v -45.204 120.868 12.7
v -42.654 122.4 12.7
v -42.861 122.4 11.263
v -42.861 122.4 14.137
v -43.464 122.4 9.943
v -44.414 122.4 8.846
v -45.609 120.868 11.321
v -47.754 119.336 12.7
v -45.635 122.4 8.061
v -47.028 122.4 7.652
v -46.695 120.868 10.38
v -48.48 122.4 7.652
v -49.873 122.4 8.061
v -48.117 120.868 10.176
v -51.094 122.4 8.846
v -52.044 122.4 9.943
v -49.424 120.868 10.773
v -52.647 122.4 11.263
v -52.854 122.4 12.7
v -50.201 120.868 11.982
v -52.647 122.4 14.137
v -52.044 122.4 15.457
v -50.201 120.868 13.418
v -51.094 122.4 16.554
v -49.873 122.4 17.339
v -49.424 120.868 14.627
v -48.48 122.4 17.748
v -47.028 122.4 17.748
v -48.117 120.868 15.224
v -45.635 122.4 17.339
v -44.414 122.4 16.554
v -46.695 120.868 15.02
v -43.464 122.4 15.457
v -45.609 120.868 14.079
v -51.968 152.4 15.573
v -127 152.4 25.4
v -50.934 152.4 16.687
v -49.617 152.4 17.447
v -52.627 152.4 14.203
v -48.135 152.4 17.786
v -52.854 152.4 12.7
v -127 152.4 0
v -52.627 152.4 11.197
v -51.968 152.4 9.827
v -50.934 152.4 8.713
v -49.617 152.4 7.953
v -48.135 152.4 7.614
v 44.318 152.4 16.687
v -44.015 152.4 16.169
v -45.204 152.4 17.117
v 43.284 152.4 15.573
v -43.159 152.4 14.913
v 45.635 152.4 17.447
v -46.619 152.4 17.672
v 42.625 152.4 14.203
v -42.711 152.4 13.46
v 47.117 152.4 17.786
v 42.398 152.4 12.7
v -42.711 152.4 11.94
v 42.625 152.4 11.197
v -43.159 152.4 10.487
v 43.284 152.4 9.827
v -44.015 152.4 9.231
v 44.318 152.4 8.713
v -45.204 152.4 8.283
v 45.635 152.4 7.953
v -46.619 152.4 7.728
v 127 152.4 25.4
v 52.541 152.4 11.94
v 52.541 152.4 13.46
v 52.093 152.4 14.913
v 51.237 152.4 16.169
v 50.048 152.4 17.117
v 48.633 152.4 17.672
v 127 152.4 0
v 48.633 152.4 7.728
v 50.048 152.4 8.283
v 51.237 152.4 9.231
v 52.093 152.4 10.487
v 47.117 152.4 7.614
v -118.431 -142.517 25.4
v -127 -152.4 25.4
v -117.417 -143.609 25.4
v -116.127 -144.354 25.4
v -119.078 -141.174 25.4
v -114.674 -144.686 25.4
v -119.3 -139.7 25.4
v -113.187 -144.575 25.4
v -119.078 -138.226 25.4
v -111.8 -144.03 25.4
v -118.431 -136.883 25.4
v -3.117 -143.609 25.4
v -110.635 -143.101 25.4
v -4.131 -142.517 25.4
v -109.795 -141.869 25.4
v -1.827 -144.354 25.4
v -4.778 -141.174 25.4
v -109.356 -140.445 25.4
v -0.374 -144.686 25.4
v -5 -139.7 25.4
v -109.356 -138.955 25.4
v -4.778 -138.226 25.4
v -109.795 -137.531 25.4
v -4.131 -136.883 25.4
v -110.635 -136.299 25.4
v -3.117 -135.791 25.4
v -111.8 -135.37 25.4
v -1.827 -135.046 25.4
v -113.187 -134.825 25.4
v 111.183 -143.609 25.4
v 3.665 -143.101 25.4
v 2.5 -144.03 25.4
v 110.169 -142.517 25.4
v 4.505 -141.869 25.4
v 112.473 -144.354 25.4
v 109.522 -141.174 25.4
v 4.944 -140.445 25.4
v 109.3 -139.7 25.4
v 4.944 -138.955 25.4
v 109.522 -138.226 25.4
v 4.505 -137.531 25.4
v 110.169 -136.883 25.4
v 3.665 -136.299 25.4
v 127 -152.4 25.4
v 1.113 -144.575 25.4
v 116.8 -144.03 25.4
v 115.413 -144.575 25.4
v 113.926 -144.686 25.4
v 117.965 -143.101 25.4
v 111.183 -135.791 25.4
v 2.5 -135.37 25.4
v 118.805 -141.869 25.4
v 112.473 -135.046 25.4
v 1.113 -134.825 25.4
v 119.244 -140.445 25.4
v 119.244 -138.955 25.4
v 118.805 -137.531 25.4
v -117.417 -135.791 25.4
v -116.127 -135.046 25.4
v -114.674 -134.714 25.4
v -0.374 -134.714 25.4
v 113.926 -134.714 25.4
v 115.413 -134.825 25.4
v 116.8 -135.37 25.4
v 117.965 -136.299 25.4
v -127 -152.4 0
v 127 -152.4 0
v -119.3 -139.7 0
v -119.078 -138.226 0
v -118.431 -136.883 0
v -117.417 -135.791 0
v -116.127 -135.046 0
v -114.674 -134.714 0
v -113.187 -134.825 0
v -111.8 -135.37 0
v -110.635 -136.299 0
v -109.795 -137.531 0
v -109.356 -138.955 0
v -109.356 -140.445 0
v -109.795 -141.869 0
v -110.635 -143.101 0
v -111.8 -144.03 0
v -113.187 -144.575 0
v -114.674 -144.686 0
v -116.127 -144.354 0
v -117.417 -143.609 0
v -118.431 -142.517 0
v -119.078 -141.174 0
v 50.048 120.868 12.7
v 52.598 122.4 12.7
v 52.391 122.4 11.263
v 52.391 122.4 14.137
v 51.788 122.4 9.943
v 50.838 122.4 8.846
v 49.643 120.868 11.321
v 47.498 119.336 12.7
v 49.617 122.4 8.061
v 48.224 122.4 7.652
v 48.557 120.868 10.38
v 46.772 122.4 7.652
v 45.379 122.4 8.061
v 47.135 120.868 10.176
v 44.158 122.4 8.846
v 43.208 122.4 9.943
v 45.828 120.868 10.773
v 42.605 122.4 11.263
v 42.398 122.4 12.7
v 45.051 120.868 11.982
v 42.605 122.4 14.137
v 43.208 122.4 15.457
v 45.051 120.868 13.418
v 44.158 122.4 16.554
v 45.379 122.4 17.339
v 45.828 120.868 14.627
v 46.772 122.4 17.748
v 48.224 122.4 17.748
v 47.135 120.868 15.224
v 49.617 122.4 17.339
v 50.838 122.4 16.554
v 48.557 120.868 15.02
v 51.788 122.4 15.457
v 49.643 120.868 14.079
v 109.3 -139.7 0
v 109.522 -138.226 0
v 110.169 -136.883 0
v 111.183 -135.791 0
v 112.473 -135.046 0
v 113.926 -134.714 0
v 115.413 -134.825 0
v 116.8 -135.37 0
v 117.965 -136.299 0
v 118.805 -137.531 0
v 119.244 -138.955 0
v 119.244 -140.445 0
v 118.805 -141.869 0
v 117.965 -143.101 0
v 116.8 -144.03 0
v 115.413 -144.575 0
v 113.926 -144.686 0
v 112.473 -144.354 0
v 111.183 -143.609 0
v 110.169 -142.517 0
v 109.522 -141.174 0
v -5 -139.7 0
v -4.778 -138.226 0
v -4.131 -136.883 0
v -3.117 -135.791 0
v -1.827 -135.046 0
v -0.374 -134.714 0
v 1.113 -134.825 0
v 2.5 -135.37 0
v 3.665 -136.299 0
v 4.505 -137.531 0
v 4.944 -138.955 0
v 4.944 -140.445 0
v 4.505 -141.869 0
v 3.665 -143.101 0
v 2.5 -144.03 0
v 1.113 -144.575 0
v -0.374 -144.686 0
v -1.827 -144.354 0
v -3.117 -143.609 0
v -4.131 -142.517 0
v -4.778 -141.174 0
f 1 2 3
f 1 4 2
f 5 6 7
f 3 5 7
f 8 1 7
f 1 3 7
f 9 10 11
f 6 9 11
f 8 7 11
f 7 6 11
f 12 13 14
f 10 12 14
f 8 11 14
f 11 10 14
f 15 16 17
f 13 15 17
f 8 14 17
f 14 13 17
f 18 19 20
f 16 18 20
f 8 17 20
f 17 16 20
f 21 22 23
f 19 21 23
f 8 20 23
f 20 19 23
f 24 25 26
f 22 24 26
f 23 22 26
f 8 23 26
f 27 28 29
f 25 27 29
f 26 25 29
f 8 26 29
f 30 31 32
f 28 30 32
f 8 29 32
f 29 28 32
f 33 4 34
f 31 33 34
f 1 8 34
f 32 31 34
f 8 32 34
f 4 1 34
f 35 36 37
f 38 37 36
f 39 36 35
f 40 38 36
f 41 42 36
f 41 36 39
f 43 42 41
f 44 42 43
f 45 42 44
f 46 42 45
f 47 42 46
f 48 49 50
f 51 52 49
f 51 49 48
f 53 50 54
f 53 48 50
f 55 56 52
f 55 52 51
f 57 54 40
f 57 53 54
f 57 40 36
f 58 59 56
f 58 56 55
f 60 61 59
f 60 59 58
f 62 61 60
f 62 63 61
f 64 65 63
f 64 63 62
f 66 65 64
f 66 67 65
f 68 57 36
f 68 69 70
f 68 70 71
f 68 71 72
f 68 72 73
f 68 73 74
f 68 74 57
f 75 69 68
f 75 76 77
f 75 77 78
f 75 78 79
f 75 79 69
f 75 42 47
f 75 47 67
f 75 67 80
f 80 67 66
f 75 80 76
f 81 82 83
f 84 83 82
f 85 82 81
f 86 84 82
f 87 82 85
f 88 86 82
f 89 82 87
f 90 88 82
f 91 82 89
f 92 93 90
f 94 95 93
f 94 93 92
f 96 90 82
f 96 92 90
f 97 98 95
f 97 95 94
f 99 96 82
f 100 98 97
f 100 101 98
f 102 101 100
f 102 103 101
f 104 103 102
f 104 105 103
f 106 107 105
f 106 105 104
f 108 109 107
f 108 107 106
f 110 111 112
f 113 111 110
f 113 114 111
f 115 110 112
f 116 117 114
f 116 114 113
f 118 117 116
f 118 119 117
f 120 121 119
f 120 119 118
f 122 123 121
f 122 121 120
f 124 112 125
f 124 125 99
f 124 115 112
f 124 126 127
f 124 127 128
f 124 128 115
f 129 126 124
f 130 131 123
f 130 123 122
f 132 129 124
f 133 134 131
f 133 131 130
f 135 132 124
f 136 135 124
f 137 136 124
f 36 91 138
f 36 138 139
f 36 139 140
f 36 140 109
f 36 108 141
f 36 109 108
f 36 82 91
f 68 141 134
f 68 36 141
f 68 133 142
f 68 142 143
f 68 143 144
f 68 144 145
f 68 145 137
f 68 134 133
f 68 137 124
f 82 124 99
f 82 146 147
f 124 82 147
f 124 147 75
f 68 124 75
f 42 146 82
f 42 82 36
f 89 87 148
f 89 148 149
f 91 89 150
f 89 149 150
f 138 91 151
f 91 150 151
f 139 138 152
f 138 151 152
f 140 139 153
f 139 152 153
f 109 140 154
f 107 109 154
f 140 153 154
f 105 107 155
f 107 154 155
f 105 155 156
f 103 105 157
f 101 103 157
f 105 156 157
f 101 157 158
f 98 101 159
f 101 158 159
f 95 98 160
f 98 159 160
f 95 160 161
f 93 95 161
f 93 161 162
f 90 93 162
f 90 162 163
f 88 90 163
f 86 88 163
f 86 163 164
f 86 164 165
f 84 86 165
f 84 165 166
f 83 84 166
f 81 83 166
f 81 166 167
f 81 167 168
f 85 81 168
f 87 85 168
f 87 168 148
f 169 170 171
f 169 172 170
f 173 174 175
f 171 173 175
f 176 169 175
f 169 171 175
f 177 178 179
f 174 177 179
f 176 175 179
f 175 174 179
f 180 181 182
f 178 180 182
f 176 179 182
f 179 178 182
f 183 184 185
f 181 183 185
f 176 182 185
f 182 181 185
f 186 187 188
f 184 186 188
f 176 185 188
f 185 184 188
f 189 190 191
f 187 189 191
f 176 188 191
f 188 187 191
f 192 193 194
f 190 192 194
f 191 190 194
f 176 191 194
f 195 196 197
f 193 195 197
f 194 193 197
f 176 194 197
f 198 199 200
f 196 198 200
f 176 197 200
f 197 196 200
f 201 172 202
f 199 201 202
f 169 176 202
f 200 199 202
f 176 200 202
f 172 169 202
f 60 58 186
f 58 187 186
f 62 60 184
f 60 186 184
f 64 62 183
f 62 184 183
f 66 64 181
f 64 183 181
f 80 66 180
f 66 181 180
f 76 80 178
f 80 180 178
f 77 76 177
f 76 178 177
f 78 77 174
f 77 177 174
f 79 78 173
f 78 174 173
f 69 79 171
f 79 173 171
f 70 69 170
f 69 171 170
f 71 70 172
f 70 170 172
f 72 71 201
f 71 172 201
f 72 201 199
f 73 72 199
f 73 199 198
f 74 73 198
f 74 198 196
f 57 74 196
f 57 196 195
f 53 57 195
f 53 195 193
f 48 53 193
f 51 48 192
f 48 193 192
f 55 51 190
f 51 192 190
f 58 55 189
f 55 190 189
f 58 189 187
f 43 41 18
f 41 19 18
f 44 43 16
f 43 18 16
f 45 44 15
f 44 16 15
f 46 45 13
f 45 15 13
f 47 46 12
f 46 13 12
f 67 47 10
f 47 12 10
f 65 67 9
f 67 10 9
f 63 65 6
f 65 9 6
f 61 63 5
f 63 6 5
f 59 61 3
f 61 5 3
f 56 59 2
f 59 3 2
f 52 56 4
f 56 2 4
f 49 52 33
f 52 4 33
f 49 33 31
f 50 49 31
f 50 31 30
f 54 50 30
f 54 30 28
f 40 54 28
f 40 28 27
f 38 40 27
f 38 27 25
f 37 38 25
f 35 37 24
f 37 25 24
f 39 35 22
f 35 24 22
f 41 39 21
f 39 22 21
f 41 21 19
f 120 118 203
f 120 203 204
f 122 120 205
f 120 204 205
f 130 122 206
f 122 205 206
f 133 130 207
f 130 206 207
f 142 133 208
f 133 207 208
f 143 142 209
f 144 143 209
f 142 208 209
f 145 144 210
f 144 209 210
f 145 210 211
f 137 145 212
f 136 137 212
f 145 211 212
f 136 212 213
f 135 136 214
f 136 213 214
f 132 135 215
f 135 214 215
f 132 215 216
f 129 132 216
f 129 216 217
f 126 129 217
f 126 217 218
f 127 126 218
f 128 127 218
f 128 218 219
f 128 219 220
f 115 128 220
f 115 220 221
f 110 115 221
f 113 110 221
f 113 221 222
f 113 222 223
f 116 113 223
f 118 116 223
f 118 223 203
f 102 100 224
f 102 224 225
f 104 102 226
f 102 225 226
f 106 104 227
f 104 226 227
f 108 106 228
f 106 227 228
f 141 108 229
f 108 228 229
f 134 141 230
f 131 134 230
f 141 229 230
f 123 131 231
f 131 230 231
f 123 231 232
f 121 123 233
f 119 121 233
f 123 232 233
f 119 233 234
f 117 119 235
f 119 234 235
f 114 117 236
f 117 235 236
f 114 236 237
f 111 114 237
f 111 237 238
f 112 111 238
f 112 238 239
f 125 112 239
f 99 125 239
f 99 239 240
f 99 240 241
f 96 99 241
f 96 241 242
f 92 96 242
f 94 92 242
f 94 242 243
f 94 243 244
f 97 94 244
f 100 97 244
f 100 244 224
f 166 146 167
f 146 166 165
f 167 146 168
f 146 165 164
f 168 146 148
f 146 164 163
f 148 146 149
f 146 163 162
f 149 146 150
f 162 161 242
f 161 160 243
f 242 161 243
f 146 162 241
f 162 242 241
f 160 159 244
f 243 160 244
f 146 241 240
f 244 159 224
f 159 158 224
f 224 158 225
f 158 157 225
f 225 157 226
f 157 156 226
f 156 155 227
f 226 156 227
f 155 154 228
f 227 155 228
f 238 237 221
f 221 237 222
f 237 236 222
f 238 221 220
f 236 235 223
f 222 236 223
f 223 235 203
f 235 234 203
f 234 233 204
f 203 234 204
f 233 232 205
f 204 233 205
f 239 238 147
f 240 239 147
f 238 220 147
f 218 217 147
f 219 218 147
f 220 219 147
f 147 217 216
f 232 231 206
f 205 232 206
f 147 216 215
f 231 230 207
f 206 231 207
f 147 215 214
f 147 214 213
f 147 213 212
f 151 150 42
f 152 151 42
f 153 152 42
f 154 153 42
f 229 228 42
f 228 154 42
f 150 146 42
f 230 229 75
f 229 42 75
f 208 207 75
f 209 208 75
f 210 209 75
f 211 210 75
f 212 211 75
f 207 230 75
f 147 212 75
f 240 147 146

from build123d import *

# Parameters (mm, degrees)
SKETCH1_W                         = 254
SKETCH1_H                         = 304.8
BOSS_EXTRUDE1_DEPTH               = 25.4
F_10_0_10_DIAMETER_HOLE1_D        = 10
TAP_DRILL_FOR_M12X1_75_TAP1_D     = 10.2
TAP_DRILL_FOR_M12X1_75_TAP1_DEPTH = 30
TAP_DRILL_FOR_M12X1_75_TAP1_TIP   = 3.064389157


with BuildPart() as part:
    # Sketch1 → Boss-Extrude1 (new body)
    with BuildSketch(Plane.XY):
        Rectangle(SKETCH1_W, SKETCH1_H)
    extrude(amount=BOSS_EXTRUDE1_DEPTH)

    # Ø10.0 (10) Diameter Hole1 (through all)
    with Locations(Plane.XY.offset(25.4)):
        with Locations((-114.3, -139.7), (0, -139.7), (114.3, -139.7)):
            Hole(F_10_0_10_DIAMETER_HOLE1_D / 2)

    # Tap Drill for M12x1.75 Tap1
    with Locations(Plane(origin=(0, 152.4, 0), x_dir=(1, 0, 0), z_dir=(0, 1, 0))):
        with Locations((-47.754, -12.7), (47.498, -12.7)):
            Hole(TAP_DRILL_FOR_M12X1_75_TAP1_D / 2, depth=TAP_DRILL_FOR_M12X1_75_TAP1_DEPTH)
            with Locations((0, 0, -(TAP_DRILL_FOR_M12X1_75_TAP1_DEPTH + TAP_DRILL_FOR_M12X1_75_TAP1_TIP / 2))):  # 118° drill point
                Cone(0, TAP_DRILL_FOR_M12X1_75_TAP1_D / 2, TAP_DRILL_FOR_M12X1_75_TAP1_TIP, mode=Mode.SUBTRACT)


solid = part.part
